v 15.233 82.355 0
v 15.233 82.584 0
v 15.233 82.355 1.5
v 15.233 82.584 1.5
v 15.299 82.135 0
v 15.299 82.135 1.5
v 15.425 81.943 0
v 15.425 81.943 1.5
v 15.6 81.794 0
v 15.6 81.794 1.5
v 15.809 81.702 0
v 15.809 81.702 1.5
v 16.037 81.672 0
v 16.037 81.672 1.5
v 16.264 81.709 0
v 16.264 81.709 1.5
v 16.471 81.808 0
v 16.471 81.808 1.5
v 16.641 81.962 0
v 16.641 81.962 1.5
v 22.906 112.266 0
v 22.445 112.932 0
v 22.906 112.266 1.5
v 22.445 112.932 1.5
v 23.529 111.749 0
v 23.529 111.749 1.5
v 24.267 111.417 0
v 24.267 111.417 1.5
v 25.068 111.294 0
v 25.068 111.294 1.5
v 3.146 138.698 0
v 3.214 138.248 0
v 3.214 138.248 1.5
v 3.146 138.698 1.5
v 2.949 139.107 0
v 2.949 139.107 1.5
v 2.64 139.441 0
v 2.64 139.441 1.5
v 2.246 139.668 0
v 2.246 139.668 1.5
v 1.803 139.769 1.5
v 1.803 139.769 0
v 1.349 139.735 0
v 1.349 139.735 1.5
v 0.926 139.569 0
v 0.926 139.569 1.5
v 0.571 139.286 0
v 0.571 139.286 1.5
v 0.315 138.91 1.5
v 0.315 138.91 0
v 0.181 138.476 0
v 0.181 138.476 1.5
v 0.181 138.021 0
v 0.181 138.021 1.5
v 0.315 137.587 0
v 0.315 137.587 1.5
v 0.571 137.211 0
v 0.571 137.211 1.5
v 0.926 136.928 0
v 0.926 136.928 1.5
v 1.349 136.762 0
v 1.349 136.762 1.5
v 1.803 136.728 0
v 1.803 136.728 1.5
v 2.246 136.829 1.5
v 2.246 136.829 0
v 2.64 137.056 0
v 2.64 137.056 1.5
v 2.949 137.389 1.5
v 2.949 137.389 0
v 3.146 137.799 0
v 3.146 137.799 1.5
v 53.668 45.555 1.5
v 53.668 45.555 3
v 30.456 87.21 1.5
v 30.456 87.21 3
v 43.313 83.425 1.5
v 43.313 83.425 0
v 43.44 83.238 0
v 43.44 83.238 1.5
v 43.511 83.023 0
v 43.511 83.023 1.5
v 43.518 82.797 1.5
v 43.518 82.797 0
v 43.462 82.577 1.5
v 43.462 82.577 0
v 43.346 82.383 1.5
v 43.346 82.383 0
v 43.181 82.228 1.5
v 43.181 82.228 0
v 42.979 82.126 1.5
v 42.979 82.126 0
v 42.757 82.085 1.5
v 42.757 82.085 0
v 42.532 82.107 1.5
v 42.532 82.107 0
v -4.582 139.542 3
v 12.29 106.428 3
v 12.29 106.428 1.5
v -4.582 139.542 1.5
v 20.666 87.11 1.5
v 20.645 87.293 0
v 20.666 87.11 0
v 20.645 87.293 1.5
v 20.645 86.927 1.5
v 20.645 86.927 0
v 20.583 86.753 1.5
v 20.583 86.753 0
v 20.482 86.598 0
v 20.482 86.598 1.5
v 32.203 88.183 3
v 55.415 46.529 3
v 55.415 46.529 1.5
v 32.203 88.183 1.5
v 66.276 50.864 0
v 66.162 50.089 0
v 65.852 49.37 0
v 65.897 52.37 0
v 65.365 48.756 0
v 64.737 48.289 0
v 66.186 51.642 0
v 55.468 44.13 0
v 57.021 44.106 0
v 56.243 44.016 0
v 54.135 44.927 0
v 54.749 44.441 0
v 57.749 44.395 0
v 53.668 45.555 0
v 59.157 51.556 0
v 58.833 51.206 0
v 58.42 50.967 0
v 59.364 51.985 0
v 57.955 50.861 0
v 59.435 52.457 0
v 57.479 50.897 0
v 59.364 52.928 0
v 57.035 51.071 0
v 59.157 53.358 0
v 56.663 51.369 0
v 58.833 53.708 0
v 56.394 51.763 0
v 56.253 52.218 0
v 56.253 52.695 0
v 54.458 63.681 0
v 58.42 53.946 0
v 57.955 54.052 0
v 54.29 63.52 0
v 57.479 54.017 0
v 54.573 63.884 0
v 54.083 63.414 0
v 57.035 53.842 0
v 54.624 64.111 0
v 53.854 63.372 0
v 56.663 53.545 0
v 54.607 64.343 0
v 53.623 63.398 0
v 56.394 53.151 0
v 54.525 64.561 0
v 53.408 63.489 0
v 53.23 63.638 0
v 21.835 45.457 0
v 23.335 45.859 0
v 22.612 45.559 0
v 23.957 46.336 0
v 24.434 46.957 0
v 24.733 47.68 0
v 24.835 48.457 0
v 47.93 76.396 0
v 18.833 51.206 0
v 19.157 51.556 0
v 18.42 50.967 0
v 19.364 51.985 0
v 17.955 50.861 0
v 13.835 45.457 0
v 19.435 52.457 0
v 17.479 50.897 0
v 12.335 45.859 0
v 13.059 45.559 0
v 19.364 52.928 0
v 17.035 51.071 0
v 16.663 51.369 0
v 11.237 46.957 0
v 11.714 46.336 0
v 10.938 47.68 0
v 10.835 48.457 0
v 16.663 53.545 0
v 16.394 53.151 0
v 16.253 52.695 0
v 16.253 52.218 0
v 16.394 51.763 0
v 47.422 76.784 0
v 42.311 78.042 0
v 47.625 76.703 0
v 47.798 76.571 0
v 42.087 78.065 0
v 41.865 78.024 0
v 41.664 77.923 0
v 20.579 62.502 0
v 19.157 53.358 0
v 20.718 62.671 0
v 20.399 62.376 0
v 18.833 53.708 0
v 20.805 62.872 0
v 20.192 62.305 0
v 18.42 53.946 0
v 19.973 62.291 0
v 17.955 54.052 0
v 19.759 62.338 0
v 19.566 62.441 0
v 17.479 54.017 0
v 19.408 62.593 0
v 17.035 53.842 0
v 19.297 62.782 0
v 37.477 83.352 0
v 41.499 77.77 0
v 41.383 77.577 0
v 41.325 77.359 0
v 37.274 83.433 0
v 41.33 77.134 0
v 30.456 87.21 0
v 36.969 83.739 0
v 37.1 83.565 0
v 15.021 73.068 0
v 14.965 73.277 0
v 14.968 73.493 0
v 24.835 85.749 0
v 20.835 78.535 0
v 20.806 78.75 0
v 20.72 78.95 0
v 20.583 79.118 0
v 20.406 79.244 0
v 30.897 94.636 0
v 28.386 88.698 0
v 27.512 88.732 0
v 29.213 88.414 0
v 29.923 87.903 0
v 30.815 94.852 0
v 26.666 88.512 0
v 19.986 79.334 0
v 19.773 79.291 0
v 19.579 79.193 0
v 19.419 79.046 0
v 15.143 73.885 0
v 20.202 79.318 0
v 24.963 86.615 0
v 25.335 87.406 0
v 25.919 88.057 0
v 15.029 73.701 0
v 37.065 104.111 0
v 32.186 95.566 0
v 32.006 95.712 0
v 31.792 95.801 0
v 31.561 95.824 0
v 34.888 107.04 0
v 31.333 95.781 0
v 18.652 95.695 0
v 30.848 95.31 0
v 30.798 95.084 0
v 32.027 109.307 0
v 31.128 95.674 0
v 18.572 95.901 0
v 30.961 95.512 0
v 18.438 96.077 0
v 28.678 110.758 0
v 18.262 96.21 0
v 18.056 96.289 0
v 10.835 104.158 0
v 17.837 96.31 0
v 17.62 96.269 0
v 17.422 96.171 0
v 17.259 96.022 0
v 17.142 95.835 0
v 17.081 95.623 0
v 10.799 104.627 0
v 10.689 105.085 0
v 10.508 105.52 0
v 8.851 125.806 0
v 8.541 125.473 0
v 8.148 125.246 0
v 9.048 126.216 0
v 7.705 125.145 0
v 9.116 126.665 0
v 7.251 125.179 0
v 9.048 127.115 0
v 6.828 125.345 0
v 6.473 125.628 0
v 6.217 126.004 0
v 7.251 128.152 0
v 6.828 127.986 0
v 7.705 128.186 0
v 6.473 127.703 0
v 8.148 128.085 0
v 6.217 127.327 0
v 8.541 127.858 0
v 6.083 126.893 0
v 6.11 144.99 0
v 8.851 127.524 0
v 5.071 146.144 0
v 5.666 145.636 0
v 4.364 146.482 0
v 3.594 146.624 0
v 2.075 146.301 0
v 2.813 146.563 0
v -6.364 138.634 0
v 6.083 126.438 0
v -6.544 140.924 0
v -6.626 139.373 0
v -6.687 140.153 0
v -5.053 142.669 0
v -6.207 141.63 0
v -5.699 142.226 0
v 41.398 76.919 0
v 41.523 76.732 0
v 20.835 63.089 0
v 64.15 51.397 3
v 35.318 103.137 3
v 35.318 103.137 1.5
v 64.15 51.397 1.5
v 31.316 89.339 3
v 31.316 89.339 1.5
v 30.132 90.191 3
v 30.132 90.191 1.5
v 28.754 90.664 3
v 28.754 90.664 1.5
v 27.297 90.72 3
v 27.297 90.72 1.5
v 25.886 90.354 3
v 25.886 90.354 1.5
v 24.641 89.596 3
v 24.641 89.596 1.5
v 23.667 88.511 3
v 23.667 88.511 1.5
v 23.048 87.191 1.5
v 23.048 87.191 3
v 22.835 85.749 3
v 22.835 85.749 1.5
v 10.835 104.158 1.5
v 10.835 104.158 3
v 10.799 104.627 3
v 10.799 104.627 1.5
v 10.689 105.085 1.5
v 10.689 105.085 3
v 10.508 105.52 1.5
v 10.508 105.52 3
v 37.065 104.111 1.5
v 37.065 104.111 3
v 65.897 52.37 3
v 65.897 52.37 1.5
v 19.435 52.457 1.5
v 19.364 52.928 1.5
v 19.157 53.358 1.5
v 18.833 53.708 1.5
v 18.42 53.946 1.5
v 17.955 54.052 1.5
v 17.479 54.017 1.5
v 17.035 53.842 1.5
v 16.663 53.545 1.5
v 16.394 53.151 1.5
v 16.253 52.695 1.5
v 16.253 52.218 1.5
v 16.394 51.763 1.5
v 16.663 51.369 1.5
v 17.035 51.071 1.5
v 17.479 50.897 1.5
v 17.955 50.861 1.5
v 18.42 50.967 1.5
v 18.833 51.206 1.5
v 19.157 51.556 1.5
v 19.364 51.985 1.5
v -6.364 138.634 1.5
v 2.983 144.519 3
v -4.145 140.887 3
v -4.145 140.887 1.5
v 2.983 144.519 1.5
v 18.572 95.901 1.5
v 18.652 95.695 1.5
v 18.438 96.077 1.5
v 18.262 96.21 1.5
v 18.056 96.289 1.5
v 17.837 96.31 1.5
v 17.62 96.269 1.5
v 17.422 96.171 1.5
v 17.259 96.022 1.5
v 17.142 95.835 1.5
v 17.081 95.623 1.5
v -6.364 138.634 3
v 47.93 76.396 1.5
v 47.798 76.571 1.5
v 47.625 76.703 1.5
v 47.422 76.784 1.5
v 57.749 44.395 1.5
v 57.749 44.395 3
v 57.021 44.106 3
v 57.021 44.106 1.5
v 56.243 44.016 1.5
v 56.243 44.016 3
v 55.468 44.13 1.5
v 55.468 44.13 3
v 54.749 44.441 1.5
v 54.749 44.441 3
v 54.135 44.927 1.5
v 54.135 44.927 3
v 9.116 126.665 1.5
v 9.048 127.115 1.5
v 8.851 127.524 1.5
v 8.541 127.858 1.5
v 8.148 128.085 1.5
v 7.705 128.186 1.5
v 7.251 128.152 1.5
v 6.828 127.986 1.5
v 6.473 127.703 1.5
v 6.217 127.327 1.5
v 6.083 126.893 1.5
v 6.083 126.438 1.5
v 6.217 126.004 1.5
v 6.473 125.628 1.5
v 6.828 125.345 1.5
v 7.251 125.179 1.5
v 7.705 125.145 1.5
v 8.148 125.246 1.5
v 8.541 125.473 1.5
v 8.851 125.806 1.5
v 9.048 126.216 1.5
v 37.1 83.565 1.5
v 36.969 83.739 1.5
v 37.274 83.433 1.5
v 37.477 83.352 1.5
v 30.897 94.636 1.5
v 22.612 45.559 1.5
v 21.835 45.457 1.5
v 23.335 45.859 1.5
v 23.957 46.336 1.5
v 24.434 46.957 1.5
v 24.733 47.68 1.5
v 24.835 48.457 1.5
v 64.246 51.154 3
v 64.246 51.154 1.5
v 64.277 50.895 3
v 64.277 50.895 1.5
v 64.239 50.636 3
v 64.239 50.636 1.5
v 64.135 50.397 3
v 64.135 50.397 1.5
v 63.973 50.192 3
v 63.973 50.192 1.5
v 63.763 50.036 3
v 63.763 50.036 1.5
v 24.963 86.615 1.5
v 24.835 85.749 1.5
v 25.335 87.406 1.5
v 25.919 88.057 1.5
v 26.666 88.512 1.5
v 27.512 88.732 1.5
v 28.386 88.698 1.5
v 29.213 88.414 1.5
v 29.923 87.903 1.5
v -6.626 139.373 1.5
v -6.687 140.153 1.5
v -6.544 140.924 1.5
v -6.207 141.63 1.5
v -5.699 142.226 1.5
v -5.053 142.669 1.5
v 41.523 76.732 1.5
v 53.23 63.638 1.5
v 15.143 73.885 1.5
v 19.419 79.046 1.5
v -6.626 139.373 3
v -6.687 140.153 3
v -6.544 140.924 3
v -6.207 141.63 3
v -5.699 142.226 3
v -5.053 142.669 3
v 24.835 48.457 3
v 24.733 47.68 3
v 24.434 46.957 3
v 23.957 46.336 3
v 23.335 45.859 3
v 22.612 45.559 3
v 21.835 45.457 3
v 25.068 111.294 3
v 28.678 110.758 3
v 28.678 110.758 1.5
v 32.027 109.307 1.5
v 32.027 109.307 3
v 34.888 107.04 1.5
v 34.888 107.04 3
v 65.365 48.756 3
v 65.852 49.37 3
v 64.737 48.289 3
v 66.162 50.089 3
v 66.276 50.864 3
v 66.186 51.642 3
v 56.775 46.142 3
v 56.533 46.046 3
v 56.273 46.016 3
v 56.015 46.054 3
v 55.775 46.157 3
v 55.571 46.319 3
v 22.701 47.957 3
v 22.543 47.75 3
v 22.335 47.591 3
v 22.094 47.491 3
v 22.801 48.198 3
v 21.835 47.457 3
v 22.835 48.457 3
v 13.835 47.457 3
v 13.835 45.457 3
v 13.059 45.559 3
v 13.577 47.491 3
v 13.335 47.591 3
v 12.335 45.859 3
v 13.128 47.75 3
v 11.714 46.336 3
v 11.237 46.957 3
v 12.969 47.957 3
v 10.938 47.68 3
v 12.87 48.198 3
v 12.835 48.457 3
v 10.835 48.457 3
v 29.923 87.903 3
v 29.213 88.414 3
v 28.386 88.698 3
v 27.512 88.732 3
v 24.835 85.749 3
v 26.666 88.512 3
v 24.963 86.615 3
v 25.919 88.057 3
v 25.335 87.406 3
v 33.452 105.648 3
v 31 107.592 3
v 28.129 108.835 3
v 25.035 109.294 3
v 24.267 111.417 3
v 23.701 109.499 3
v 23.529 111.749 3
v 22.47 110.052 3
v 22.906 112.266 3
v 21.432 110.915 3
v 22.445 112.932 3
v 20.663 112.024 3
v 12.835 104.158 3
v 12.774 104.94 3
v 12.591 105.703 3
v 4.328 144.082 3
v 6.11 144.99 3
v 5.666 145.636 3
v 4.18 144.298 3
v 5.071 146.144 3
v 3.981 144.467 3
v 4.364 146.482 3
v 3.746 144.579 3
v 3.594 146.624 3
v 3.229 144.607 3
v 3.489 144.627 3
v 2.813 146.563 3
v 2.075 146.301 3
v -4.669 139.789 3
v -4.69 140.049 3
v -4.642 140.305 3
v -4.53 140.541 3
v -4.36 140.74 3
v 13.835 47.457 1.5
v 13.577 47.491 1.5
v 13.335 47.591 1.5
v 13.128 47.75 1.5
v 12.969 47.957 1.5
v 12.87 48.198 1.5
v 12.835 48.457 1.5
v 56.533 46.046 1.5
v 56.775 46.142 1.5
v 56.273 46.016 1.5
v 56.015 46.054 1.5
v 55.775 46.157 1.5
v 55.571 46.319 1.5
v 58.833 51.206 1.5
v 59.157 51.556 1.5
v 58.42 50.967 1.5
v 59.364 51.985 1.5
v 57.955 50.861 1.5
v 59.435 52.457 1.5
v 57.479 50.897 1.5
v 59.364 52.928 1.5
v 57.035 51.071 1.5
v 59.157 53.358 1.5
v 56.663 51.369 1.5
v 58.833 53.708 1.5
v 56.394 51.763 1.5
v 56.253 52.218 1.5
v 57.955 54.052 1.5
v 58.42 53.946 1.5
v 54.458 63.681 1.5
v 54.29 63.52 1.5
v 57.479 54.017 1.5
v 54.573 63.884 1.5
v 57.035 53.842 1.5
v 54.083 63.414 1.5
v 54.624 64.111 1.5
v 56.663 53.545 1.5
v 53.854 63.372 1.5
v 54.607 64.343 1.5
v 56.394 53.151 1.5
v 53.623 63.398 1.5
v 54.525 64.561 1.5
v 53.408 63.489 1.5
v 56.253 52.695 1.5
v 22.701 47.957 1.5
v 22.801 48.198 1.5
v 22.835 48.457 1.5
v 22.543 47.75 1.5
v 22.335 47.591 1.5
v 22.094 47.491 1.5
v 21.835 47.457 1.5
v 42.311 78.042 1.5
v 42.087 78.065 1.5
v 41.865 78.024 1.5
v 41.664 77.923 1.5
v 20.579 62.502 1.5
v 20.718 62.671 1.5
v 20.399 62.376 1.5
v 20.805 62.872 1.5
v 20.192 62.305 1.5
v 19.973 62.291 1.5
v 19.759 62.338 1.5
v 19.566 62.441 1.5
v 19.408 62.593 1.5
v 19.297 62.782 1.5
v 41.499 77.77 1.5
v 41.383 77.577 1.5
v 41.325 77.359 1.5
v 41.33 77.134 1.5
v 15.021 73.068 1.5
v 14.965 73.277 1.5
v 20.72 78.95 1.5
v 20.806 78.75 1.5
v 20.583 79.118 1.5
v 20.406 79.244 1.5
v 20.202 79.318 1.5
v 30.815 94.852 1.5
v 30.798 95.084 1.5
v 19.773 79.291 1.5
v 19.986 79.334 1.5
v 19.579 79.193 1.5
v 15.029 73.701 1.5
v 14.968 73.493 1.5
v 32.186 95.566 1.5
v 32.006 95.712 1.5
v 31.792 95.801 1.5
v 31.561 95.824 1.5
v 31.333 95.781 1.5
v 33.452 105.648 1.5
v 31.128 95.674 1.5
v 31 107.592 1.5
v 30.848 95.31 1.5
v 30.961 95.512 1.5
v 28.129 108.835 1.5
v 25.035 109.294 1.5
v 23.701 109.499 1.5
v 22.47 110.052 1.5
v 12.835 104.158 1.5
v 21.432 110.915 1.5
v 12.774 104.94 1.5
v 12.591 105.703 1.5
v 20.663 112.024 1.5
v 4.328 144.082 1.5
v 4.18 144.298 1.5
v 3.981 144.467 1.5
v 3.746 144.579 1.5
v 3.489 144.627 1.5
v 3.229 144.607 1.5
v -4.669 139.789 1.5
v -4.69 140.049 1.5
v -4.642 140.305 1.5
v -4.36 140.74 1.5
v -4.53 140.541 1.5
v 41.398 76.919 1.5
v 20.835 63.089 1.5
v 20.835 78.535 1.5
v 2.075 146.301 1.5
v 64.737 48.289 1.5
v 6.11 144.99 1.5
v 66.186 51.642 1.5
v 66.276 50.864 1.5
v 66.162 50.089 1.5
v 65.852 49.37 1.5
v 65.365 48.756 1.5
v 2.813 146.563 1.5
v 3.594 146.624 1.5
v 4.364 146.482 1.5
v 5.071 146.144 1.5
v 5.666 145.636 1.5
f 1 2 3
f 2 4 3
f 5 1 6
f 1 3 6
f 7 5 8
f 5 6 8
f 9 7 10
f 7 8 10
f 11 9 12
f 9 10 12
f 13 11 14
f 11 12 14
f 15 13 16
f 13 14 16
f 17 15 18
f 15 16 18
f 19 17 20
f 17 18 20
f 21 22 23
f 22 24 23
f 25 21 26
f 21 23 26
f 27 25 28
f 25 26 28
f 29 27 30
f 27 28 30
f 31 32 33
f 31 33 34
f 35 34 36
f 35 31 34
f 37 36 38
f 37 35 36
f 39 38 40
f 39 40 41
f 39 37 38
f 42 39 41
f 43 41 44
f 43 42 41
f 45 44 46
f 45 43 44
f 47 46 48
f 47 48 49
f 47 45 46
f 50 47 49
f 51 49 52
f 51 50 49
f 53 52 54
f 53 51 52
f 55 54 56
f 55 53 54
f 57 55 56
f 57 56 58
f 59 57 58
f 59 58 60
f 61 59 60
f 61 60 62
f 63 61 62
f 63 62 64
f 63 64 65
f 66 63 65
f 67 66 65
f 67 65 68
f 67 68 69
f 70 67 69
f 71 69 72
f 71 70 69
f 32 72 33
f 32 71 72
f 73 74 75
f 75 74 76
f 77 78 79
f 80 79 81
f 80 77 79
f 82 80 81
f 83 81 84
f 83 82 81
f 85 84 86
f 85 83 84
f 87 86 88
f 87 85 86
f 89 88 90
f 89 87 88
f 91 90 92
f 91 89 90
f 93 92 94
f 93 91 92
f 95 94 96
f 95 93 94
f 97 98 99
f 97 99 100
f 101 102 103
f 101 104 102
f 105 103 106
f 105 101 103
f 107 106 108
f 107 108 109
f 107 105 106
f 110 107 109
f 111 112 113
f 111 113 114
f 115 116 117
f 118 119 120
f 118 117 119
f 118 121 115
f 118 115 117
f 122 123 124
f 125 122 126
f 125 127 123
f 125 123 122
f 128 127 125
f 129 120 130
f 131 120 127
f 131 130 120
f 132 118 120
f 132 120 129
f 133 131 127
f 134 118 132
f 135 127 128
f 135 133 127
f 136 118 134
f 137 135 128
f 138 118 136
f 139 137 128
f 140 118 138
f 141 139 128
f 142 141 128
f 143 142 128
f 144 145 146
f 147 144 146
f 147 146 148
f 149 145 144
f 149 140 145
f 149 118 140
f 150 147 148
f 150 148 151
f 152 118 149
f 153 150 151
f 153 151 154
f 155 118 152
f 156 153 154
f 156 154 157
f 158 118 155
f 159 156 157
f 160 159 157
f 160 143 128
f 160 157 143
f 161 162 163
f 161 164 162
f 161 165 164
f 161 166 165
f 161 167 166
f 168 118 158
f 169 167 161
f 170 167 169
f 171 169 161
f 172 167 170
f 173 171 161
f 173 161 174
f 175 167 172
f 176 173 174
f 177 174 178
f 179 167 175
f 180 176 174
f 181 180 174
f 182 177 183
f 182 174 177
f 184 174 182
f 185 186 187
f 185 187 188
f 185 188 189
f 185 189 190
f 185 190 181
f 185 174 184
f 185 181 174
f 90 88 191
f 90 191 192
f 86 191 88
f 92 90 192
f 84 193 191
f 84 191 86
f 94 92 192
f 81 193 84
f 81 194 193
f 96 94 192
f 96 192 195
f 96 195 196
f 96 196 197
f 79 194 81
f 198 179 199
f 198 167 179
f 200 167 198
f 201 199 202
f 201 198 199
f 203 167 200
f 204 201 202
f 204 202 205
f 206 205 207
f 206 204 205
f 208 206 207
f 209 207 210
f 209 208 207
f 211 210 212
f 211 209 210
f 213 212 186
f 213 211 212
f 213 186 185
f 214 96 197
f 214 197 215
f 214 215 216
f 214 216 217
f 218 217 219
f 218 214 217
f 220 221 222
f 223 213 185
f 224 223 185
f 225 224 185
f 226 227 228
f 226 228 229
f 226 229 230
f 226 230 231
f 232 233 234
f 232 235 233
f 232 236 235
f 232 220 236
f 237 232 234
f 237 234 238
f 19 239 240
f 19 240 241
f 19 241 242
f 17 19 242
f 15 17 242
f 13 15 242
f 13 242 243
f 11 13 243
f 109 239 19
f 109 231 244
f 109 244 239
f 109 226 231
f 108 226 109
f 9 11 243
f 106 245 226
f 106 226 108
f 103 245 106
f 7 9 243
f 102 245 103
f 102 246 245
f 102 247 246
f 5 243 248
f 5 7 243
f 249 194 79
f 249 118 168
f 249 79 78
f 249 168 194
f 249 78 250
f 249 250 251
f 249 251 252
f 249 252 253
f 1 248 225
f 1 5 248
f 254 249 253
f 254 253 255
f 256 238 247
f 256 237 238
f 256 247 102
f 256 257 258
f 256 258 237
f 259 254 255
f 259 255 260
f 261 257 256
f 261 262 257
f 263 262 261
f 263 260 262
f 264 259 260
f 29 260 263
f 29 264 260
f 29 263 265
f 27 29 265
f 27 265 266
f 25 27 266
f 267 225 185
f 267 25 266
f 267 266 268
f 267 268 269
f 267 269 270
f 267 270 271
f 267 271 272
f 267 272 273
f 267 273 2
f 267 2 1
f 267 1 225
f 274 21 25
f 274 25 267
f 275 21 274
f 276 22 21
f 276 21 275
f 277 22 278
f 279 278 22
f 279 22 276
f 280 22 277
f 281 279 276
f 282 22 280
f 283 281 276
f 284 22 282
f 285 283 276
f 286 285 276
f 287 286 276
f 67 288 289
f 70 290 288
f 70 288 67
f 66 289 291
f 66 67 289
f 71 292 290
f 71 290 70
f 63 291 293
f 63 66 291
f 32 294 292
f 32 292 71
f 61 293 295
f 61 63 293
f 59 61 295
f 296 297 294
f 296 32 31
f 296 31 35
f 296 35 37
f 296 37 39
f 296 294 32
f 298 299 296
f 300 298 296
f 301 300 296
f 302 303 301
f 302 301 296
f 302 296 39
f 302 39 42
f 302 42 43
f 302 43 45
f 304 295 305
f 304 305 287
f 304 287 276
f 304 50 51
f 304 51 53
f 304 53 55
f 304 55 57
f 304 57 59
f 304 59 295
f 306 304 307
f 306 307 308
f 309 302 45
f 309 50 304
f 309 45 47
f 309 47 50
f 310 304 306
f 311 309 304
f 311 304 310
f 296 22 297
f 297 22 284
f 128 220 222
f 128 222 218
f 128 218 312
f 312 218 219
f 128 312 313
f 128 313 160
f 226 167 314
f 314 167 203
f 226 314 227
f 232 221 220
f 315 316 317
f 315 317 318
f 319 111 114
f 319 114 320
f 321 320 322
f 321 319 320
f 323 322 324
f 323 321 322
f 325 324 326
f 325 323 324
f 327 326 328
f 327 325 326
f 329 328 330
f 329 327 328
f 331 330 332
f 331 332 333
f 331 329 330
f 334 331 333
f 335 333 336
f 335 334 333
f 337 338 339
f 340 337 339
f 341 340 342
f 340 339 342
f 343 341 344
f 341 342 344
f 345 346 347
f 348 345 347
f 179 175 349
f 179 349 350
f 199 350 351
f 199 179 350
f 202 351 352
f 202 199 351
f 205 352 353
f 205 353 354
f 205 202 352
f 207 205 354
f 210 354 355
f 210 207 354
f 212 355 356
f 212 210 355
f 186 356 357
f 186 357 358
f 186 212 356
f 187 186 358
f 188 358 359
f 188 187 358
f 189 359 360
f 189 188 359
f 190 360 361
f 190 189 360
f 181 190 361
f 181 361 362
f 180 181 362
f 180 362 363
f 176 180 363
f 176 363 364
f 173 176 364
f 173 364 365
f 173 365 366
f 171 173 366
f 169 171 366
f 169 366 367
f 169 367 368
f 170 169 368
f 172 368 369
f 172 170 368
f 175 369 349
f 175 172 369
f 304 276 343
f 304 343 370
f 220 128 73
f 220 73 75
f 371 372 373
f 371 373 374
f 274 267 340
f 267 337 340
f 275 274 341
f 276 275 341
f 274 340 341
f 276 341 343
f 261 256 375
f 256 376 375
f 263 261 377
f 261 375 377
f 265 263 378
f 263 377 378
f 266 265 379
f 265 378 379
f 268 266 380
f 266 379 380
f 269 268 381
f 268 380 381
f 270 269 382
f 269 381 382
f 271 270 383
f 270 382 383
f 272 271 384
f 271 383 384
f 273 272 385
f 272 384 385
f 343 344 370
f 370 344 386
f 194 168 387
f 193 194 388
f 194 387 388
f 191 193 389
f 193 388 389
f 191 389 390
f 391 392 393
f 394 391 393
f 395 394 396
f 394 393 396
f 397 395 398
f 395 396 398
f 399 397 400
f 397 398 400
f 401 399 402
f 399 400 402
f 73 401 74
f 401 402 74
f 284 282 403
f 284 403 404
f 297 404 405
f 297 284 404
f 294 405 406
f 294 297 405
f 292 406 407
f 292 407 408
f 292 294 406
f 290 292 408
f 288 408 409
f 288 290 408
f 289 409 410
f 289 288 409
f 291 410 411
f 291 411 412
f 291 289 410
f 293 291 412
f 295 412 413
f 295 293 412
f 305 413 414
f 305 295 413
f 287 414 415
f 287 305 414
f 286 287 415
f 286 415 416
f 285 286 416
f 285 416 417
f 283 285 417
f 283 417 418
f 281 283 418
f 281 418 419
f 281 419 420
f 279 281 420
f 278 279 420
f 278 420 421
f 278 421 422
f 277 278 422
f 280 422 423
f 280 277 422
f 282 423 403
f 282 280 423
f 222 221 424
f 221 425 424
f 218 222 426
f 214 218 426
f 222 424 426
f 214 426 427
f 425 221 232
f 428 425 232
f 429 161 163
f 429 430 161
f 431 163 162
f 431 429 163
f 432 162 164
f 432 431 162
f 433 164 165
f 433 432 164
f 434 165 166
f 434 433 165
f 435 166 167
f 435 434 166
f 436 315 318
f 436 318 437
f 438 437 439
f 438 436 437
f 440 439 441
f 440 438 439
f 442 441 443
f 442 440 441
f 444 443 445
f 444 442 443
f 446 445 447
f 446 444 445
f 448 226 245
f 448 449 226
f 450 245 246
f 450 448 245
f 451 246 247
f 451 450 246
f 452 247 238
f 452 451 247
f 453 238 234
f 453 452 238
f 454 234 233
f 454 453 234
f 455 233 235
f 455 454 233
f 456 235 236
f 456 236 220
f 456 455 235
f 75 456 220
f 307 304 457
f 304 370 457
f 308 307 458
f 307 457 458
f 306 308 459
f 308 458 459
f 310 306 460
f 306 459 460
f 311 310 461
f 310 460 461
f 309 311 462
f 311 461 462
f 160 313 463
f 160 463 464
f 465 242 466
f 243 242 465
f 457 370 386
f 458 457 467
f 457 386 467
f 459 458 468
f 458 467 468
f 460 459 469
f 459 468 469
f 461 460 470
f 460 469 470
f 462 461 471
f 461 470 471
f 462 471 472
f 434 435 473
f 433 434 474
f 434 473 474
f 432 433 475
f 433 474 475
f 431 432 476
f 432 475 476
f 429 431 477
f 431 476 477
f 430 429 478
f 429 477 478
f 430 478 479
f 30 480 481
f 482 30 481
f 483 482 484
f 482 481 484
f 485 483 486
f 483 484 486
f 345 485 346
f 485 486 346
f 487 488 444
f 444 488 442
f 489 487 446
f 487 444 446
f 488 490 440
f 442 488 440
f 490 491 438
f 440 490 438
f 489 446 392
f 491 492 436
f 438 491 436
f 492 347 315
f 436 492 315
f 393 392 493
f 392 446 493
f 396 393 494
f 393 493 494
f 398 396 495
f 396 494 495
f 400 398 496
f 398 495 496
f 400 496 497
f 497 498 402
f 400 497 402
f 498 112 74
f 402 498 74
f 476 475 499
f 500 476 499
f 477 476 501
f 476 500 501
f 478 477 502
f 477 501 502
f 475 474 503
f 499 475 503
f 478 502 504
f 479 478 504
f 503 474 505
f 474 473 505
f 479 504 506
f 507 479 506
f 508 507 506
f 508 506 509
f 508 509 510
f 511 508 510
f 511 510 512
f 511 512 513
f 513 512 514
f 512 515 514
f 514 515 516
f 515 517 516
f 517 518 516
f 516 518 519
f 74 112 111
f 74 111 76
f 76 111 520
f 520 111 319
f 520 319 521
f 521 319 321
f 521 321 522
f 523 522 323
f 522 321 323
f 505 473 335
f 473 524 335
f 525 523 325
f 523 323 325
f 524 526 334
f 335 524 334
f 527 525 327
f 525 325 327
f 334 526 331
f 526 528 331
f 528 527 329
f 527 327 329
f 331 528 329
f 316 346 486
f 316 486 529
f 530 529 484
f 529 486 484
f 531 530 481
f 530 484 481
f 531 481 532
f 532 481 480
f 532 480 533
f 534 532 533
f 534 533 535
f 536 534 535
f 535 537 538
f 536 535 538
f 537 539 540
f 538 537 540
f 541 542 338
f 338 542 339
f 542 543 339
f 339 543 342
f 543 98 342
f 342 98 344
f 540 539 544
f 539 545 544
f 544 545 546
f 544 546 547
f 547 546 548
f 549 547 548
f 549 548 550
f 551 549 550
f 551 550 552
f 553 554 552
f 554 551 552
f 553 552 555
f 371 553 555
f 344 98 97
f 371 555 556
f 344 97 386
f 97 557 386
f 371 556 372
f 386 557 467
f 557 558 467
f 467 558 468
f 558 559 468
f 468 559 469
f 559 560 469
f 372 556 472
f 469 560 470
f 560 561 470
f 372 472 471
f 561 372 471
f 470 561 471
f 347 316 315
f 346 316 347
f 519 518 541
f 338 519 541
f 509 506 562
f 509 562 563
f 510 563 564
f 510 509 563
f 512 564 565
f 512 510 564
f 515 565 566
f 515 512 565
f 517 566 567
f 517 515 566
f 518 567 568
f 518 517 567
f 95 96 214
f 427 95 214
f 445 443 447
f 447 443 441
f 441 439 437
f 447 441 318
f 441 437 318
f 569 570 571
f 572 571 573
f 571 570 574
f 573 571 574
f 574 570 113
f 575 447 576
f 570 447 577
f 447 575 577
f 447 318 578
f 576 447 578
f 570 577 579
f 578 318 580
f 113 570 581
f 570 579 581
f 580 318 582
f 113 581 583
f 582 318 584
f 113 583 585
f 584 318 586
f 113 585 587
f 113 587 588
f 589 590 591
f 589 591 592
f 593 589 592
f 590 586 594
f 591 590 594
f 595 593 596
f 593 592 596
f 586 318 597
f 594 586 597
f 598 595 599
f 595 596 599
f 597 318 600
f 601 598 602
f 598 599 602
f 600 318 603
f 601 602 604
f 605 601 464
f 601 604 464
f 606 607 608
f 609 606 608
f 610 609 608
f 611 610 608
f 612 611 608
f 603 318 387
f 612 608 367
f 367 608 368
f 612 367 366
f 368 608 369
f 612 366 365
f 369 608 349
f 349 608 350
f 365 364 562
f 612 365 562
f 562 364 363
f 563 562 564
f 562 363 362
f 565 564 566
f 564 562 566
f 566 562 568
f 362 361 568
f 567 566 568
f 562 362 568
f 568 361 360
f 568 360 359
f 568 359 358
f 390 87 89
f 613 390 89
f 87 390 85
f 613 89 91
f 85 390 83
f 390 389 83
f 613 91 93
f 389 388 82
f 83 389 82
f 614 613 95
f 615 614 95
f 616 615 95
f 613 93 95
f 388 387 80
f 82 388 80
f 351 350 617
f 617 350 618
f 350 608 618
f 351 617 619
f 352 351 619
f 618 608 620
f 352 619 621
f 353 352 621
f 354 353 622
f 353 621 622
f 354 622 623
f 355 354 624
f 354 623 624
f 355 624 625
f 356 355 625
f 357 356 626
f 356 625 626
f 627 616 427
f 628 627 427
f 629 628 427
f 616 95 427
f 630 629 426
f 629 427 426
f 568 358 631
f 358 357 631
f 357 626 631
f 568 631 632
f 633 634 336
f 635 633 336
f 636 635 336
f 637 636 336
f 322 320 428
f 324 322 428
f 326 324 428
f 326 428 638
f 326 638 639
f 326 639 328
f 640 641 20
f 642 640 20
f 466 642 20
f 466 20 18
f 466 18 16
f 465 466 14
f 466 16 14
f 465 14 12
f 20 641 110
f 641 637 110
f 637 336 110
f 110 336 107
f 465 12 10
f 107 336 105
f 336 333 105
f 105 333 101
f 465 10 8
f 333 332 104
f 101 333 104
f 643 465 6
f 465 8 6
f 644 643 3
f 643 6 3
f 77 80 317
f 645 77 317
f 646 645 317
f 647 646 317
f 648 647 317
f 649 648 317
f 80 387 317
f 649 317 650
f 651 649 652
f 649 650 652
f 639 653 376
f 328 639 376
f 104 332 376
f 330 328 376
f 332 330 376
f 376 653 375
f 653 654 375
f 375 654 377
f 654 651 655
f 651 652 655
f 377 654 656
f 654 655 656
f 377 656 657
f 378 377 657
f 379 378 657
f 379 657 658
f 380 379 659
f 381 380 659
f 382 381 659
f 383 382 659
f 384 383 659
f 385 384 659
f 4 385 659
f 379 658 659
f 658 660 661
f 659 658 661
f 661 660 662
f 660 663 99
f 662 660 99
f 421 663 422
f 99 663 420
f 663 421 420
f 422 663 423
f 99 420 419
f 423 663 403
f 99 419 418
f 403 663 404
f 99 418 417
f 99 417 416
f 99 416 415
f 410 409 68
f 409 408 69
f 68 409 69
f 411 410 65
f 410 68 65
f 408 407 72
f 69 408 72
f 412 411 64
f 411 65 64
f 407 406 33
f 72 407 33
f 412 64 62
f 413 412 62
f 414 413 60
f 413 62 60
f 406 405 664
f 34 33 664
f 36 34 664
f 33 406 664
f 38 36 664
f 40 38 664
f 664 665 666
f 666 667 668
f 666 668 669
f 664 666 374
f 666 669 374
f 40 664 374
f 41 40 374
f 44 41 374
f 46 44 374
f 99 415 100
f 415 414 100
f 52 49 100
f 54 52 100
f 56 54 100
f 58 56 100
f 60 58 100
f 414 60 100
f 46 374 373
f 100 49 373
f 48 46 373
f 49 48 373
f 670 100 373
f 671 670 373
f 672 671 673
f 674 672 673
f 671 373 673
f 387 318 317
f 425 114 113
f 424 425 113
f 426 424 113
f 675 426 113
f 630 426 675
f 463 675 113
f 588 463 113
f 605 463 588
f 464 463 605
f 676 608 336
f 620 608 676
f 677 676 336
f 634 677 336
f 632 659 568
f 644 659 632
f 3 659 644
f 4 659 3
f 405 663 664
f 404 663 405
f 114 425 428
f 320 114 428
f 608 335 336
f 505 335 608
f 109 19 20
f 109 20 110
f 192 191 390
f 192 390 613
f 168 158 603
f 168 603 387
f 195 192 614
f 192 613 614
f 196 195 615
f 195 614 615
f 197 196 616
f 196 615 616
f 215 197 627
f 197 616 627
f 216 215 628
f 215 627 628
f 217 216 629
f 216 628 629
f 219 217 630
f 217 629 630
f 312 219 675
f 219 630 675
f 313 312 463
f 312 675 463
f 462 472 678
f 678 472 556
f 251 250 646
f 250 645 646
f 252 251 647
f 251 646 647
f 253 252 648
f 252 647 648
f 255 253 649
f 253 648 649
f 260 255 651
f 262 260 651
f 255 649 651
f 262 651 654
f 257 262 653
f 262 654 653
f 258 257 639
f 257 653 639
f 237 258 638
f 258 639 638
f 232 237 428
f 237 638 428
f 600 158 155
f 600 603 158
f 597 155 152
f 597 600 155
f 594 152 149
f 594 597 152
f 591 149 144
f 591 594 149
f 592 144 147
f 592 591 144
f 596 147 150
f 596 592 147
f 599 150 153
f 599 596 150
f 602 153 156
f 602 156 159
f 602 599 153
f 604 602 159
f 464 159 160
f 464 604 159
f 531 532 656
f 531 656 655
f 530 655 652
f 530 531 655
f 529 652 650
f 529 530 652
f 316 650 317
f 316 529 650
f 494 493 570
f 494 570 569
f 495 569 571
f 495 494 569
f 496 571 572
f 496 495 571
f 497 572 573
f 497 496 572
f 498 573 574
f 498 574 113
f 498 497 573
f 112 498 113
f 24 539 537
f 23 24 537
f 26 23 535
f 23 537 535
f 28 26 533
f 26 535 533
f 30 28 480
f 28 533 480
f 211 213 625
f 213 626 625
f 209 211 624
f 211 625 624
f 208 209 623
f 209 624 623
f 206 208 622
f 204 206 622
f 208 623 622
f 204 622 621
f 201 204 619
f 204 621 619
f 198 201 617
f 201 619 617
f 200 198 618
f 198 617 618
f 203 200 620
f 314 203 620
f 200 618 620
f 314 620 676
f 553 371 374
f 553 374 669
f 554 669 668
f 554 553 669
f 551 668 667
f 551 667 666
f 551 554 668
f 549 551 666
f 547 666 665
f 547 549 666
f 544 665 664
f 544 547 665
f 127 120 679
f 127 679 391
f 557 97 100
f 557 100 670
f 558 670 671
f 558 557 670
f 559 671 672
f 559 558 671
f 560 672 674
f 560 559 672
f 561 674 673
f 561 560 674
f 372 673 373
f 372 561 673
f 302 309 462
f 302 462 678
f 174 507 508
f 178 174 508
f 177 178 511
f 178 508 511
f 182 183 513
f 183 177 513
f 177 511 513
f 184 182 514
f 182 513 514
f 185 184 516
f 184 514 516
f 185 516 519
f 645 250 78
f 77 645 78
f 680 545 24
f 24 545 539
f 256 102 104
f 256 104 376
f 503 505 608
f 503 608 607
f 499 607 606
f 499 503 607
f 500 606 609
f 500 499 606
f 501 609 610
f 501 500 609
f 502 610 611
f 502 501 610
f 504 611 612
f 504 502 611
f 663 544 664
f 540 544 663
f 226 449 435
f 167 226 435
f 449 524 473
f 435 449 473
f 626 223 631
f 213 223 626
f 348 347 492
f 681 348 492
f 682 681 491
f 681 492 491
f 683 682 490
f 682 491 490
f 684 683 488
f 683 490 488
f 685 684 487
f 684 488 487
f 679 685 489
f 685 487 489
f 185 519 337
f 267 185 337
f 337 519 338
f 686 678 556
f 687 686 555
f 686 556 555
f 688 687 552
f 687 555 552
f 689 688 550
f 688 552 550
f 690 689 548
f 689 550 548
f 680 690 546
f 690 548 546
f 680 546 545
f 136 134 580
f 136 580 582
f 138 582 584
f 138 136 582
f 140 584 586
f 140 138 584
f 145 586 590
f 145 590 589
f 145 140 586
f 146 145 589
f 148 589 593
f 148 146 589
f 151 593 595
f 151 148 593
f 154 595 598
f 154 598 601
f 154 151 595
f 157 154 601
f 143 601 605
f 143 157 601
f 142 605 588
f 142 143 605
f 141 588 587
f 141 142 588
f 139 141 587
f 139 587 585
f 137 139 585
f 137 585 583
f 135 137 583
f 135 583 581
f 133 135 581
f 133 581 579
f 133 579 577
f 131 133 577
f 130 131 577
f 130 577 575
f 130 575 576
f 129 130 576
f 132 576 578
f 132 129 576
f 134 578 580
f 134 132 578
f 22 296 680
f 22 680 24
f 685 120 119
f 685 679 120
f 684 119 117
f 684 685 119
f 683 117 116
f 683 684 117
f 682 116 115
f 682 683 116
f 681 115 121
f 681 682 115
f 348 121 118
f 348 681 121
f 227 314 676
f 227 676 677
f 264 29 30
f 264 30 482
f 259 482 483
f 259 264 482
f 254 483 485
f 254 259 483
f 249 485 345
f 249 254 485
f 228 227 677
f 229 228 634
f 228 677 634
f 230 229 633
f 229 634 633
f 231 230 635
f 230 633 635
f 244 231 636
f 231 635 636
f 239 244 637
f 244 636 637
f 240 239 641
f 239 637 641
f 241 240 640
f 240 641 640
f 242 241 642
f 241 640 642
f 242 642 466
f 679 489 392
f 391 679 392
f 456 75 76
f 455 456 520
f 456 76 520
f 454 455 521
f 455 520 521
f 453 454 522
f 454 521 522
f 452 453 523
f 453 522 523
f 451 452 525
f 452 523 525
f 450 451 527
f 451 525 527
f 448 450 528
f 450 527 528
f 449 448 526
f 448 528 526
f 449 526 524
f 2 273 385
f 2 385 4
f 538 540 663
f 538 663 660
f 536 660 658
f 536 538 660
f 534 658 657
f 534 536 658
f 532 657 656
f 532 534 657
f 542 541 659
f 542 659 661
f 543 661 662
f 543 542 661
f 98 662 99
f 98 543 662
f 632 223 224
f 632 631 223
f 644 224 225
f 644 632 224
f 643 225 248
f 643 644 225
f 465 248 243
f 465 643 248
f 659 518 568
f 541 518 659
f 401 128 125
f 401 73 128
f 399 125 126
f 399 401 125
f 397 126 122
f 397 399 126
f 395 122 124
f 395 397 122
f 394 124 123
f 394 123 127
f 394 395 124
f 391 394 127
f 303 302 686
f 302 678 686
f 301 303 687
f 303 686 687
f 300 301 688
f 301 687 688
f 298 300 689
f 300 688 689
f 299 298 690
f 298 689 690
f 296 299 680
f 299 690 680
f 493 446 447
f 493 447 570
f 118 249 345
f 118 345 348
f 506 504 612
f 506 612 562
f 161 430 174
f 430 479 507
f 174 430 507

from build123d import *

# Parameters (mm, degrees)
SCHIZZO2_R                   = 1.6
SCHIZZO2_R_2                 = 1.525
ESTRUSIONE_ESTRUSIONE1_DEPTH = 1.5
RACCORDO1_R                  = 3
TAGLIO_ESTRUSIONE1_DEPTH     = 161.918381387
ESTRUSIONE_ESTRUSIONE2_START = -1.5
ESTRUSIONE_ESTRUSIONE2_DEPTH = 1.5
RACCORDO2_R                  = 0.8


with BuildPart() as part:
    # Schizzo2 → Estrusione-Estrusione1 (new body)
    with BuildSketch(Plane.XY):
        with BuildLine():
            Line((10.835450111, 45.456844872), (10.835450111, 104.878132603))
            Line((10.835450111, 104.878132603), (-7.726239407, 141.30749945))
            Line((-7.726239407, 141.30749945), (4.747851932, 147.663366447))
            Line((4.747851932, 147.663366447), (23.319883285, 111.213702604))
            ThreePointArc((23.319883285, 111.213702604), (31.262689996, 109.733445118), (37.064853942, 104.110791454))
            Line((37.064853942, 104.110791454), (67.357558736, 49.749549666))
            Line((67.357558736, 49.749549666), (55.128154906, 42.934736247))
            Line((55.128154906, 42.934736247), (24.835450111, 97.295978034))
            Line((24.835450111, 97.295978034), (24.835450111, 45.456844872))
            Line((24.835450111, 45.456844872), (10.835450111, 45.456844872))
        make_face()
        with Locations((17.835450111, 52.456844872)):
            Circle(SCHIZZO2_R, mode=Mode.SUBTRACT)
        with Locations((57.835450111, 52.456844872)):
            Circle(SCHIZZO2_R, mode=Mode.SUBTRACT)
        with Locations((1.688739761, 138.248387279)):
            Circle(SCHIZZO2_R_2, mode=Mode.SUBTRACT)
        with Locations((7.590616257, 126.665302465)):
            Circle(SCHIZZO2_R_2, mode=Mode.SUBTRACT)
    extrude(amount=ESTRUSIONE_ESTRUSIONE1_DEPTH)

    # Raccordo1
    raccordo1_edges = [part.edges().sort_by_distance(p)[0] for p in [
        (10.835450111, 45.456844872, 0.75),
        (10.835450111, 104.878132603, 0.75),
        (-7.726239407, 141.30749945, 0.75),
        (4.747851932, 147.663366447, 0.75),
        (23.319883285, 111.213702604, 0.75),
        (67.357558736, 49.749549666, 0.75),
        (55.128154906, 42.934736247, 0.75),
        (24.835450111, 97.295978034, 0.75),
        (24.835450111, 45.456844872, 0.75),
    ]]
    fillet(raccordo1_edges, radius=RACCORDO1_R)

    # Schizzo3 → Taglio-Estrusione1 (cut, through all)
    with BuildSketch(Plane(origin=(0, 0, 0), x_dir=(-1, 0, 0), z_dir=(0, 0, -1))):
        Polygon((-58.032865762, 58.26562082), (-47.760114135, 76.700406977), (-39.799110822, 78.660596286), align=None)
        Polygon((-45.099489196, 81.47498477), (-37.138485884, 83.435174078), (-27.576187875, 100.595028163), align=None)
        Polygon((-14.835450111, 73.513329832), (-20.835450111, 59.080649935), (-20.835450111, 80.754828538), align=None)
        Polygon((-20.736858212, 86.90531457), (-17.675265193, 99.811833972), (-14.835450111, 79.782808049), align=None)
    extrude(amount=-TAGLIO_ESTRUSIONE1_DEPTH, mode=Mode.SUBTRACT)

    # Schizzo4 → Estrusione-Estrusione2 (add)
    with BuildSketch(Plane(origin=(0, 0, 1.5), x_dir=(-1, 0, 0), z_dir=(0, 0, -1)).offset(ESTRUSIONE_ESTRUSIONE2_START)):
        with BuildLine():
            Line((5.053219834, 142.669470949), (-2.074832359, 146.301394947))
            ThreePointArc((-2.074832359, 146.301394947), (-4.363854842, 146.481544924), (-6.109823431, 144.990346874))
            Line((-6.109823431, 144.990346874), (-22.444537387, 112.93166566))
            ThreePointArc((-22.444537387, 112.93166566), (-23.528890764, 111.74881109), (-25.067773398, 111.294050255))
            ThreePointArc((-25.067773398, 111.294050255), (-32.027352671, 109.307494906), (-37.064853942, 104.110791454))
            Line((-37.064853942, 104.110791454), (-65.897241575, 52.370136202))
            ThreePointArc((-65.897241575, 52.370136202), (-66.162289717, 50.089384698), (-64.736972201, 48.289232505))
            Line((-64.736972201, 48.289232505), (-57.748741441, 44.395053408))
            ThreePointArc((-57.748741441, 44.395053408), (-55.467989937, 44.130005266), (-53.667837744, 45.555322782))
            Line((-53.667837744, 45.555322782), (-30.456036646, 87.209653102))
            ThreePointArc((-30.456036646, 87.209653102), (-27.081049556, 88.652933675), (-24.835450111, 85.749335941))
            Line((-24.835450111, 85.749335941), (-24.835450111, 48.456844872))
            ThreePointArc((-24.835450111, 48.456844872), (-23.956770454, 46.335524528), (-21.835450111, 45.456844872))
            Line((-21.835450111, 45.456844872), (-13.835450111, 45.456844872))
            ThreePointArc((-13.835450111, 45.456844872), (-11.714129767, 46.335524528), (-10.835450111, 48.456844872))
            Line((-10.835450111, 48.456844872), (-10.835450111, 104.157896326))
            ThreePointArc((-10.835450111, 104.157896326), (-10.752559872, 104.858232417), (-10.508469683, 105.519867825))
            Line((-10.508469683, 105.519867825), (6.364267908, 138.634479878))
            ThreePointArc((6.364267908, 138.634479878), (6.544417884, 140.92350236), (5.053219834, 142.669470949))
        make_face()
        with BuildLine():
            Line((-35.317796251, 103.13724668), (-64.150183885, 51.396591427))
            ThreePointArc((-64.150183885, 51.396591427), (-64.238533265, 50.636340926), (-63.763427427, 50.036290195))
            Line((-63.763427427, 50.036290195), (-56.775196666, 46.142111098))
            ThreePointArc((-56.775196666, 46.142111098), (-56.014946165, 46.053761717), (-55.414895434, 46.528867556))
            Line((-55.414895434, 46.528867556), (-32.203094336, 88.183197876))
            ThreePointArc((-32.203094336, 88.183197876), (-26.578115853, 90.588665498), (-22.835450111, 85.749335941))
            Line((-22.835450111, 85.749335941), (-22.835450111, 48.456844872))
            ThreePointArc((-22.835450111, 48.456844872), (-22.542556892, 47.749738091), (-21.835450111, 47.456844872))
            Line((-21.835450111, 47.456844872), (-13.835450111, 47.456844872))
            ThreePointArc((-13.835450111, 47.456844872), (-13.12834333, 47.749738091), (-12.835450111, 48.456844872))
            Line((-12.835450111, 48.456844872), (-12.835450111, 104.157896326))
            ThreePointArc((-12.835450111, 104.157896326), (-12.697299713, 105.325123145), (-12.290482732, 106.427848824))
            Line((-12.290482732, 106.427848824), (4.582254859, 139.542460877))
            ThreePointArc((4.582254859, 139.542460877), (4.642304851, 140.305468371), (4.145238835, 140.887457901))
            Line((4.145238835, 140.887457901), (-2.982813359, 144.519381899))
            ThreePointArc((-2.982813359, 144.519381899), (-3.745820853, 144.579431891), (-4.327810383, 144.082365875))
            Line((-4.327810383, 144.082365875), (-20.662524339, 112.02368466))
            ThreePointArc((-20.662524339, 112.02368466), (-22.469779967, 110.052260378), (-25.034584357, 109.294325652))
            ThreePointArc((-25.034584357, 109.294325652), (-30.99993802, 107.591563924), (-35.317796251, 103.13724668))
        make_face(mode=Mode.SUBTRACT)
    extrude(amount=ESTRUSIONE_ESTRUSIONE2_DEPTH)

    # Raccordo2
    raccordo2_edges = [part.edges().sort_by_distance(p)[0] for p in [
        (39.799110822, 78.660596286, 0.75),
        (58.032865762, 58.26562082, 0.75),
        (47.760114135, 76.700406977, 0.75),
        (45.099489196, 81.47498477, 0.75),
        (27.576187875, 100.595028163, 0.75),
        (37.138485884, 83.435174078, 0.75),
        (20.835450111, 80.754828538, 0.75),
        (14.835450111, 73.513329832, 0.75),
        (20.835450111, 59.080649935, 0.75),
        (14.835450111, 79.782808049, 0.75),
        (20.736858212, 86.90531457, 0.75),
        (17.675265193, 99.811833972, 0.75),
    ]]
    fillet(raccordo2_edges, radius=RACCORDO2_R)


solid = part.part
